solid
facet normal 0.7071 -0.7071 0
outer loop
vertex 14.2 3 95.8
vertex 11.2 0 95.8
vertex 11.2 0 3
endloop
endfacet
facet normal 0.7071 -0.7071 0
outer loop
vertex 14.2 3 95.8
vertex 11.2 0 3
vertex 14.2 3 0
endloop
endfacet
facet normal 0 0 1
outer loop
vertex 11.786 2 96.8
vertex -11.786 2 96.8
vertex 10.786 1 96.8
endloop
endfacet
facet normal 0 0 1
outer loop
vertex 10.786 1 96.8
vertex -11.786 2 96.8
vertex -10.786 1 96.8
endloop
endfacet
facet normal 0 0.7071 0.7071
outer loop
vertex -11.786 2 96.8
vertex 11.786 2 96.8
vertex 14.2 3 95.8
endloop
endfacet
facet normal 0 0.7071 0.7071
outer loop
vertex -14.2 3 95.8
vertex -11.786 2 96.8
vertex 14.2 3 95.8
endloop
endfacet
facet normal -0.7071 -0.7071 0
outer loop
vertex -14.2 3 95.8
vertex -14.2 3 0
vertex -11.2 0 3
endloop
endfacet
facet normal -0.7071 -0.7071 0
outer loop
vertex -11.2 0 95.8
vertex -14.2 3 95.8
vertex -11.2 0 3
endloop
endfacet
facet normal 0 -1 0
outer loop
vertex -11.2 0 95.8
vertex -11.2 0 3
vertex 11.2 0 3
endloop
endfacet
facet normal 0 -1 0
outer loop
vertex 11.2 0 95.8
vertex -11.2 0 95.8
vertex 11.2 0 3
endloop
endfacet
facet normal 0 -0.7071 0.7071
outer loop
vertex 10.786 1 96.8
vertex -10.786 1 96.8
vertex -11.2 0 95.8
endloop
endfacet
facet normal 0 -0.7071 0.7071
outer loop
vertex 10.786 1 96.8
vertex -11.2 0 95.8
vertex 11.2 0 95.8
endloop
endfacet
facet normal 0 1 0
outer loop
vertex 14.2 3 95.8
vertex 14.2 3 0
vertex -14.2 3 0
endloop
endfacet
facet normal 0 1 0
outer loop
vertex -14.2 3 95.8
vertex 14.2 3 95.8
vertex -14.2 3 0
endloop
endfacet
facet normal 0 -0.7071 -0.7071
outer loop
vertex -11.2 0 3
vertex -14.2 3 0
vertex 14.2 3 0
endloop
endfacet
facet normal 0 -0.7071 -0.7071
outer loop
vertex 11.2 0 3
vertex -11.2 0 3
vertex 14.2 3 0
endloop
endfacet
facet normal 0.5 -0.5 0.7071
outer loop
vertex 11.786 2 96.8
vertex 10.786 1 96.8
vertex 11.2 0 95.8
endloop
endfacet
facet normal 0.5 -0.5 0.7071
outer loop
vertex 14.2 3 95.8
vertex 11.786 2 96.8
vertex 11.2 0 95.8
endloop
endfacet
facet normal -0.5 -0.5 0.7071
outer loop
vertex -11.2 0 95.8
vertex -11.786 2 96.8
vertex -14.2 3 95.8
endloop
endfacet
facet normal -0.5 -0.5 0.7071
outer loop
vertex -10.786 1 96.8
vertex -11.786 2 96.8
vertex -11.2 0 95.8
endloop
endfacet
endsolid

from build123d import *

# Parameters (mm, degrees)
BOSS_EXTRU_1_DEPTH = 96.8
CHANFREIN1_SIZE    = 1
CHANFREIN2_SIZE    = 3


with BuildPart() as part:
    # Esquisse1 → Boss.-Extru.1 (new body)
    with BuildSketch(Plane.XY):
        Polygon((-11.2, 0), (11.2, 0), (14.2, 3), (-14.2, 3), align=None)
    extrude(amount=BOSS_EXTRU_1_DEPTH)

    # Chanfrein1
    chanfrein1_edges = [part.edges().sort_by_distance(p)[0] for p in [
        (-12.7, 1.5, 96.8),
        (0, 0, 96.8),
        (12.7, 1.5, 96.8),
        (0, 3, 96.8),
    ]]
    chamfer(chanfrein1_edges, length=CHANFREIN1_SIZE)

    # Chanfrein2
    chanfrein2_edges = [part.edges().sort_by_distance(p)[0] for p in [
        (0, 0, 0),
    ]]
    chamfer(chanfrein2_edges, length=CHANFREIN2_SIZE - 0.0001)  # a hair under: the kernel refuses the full size


solid = part.part
